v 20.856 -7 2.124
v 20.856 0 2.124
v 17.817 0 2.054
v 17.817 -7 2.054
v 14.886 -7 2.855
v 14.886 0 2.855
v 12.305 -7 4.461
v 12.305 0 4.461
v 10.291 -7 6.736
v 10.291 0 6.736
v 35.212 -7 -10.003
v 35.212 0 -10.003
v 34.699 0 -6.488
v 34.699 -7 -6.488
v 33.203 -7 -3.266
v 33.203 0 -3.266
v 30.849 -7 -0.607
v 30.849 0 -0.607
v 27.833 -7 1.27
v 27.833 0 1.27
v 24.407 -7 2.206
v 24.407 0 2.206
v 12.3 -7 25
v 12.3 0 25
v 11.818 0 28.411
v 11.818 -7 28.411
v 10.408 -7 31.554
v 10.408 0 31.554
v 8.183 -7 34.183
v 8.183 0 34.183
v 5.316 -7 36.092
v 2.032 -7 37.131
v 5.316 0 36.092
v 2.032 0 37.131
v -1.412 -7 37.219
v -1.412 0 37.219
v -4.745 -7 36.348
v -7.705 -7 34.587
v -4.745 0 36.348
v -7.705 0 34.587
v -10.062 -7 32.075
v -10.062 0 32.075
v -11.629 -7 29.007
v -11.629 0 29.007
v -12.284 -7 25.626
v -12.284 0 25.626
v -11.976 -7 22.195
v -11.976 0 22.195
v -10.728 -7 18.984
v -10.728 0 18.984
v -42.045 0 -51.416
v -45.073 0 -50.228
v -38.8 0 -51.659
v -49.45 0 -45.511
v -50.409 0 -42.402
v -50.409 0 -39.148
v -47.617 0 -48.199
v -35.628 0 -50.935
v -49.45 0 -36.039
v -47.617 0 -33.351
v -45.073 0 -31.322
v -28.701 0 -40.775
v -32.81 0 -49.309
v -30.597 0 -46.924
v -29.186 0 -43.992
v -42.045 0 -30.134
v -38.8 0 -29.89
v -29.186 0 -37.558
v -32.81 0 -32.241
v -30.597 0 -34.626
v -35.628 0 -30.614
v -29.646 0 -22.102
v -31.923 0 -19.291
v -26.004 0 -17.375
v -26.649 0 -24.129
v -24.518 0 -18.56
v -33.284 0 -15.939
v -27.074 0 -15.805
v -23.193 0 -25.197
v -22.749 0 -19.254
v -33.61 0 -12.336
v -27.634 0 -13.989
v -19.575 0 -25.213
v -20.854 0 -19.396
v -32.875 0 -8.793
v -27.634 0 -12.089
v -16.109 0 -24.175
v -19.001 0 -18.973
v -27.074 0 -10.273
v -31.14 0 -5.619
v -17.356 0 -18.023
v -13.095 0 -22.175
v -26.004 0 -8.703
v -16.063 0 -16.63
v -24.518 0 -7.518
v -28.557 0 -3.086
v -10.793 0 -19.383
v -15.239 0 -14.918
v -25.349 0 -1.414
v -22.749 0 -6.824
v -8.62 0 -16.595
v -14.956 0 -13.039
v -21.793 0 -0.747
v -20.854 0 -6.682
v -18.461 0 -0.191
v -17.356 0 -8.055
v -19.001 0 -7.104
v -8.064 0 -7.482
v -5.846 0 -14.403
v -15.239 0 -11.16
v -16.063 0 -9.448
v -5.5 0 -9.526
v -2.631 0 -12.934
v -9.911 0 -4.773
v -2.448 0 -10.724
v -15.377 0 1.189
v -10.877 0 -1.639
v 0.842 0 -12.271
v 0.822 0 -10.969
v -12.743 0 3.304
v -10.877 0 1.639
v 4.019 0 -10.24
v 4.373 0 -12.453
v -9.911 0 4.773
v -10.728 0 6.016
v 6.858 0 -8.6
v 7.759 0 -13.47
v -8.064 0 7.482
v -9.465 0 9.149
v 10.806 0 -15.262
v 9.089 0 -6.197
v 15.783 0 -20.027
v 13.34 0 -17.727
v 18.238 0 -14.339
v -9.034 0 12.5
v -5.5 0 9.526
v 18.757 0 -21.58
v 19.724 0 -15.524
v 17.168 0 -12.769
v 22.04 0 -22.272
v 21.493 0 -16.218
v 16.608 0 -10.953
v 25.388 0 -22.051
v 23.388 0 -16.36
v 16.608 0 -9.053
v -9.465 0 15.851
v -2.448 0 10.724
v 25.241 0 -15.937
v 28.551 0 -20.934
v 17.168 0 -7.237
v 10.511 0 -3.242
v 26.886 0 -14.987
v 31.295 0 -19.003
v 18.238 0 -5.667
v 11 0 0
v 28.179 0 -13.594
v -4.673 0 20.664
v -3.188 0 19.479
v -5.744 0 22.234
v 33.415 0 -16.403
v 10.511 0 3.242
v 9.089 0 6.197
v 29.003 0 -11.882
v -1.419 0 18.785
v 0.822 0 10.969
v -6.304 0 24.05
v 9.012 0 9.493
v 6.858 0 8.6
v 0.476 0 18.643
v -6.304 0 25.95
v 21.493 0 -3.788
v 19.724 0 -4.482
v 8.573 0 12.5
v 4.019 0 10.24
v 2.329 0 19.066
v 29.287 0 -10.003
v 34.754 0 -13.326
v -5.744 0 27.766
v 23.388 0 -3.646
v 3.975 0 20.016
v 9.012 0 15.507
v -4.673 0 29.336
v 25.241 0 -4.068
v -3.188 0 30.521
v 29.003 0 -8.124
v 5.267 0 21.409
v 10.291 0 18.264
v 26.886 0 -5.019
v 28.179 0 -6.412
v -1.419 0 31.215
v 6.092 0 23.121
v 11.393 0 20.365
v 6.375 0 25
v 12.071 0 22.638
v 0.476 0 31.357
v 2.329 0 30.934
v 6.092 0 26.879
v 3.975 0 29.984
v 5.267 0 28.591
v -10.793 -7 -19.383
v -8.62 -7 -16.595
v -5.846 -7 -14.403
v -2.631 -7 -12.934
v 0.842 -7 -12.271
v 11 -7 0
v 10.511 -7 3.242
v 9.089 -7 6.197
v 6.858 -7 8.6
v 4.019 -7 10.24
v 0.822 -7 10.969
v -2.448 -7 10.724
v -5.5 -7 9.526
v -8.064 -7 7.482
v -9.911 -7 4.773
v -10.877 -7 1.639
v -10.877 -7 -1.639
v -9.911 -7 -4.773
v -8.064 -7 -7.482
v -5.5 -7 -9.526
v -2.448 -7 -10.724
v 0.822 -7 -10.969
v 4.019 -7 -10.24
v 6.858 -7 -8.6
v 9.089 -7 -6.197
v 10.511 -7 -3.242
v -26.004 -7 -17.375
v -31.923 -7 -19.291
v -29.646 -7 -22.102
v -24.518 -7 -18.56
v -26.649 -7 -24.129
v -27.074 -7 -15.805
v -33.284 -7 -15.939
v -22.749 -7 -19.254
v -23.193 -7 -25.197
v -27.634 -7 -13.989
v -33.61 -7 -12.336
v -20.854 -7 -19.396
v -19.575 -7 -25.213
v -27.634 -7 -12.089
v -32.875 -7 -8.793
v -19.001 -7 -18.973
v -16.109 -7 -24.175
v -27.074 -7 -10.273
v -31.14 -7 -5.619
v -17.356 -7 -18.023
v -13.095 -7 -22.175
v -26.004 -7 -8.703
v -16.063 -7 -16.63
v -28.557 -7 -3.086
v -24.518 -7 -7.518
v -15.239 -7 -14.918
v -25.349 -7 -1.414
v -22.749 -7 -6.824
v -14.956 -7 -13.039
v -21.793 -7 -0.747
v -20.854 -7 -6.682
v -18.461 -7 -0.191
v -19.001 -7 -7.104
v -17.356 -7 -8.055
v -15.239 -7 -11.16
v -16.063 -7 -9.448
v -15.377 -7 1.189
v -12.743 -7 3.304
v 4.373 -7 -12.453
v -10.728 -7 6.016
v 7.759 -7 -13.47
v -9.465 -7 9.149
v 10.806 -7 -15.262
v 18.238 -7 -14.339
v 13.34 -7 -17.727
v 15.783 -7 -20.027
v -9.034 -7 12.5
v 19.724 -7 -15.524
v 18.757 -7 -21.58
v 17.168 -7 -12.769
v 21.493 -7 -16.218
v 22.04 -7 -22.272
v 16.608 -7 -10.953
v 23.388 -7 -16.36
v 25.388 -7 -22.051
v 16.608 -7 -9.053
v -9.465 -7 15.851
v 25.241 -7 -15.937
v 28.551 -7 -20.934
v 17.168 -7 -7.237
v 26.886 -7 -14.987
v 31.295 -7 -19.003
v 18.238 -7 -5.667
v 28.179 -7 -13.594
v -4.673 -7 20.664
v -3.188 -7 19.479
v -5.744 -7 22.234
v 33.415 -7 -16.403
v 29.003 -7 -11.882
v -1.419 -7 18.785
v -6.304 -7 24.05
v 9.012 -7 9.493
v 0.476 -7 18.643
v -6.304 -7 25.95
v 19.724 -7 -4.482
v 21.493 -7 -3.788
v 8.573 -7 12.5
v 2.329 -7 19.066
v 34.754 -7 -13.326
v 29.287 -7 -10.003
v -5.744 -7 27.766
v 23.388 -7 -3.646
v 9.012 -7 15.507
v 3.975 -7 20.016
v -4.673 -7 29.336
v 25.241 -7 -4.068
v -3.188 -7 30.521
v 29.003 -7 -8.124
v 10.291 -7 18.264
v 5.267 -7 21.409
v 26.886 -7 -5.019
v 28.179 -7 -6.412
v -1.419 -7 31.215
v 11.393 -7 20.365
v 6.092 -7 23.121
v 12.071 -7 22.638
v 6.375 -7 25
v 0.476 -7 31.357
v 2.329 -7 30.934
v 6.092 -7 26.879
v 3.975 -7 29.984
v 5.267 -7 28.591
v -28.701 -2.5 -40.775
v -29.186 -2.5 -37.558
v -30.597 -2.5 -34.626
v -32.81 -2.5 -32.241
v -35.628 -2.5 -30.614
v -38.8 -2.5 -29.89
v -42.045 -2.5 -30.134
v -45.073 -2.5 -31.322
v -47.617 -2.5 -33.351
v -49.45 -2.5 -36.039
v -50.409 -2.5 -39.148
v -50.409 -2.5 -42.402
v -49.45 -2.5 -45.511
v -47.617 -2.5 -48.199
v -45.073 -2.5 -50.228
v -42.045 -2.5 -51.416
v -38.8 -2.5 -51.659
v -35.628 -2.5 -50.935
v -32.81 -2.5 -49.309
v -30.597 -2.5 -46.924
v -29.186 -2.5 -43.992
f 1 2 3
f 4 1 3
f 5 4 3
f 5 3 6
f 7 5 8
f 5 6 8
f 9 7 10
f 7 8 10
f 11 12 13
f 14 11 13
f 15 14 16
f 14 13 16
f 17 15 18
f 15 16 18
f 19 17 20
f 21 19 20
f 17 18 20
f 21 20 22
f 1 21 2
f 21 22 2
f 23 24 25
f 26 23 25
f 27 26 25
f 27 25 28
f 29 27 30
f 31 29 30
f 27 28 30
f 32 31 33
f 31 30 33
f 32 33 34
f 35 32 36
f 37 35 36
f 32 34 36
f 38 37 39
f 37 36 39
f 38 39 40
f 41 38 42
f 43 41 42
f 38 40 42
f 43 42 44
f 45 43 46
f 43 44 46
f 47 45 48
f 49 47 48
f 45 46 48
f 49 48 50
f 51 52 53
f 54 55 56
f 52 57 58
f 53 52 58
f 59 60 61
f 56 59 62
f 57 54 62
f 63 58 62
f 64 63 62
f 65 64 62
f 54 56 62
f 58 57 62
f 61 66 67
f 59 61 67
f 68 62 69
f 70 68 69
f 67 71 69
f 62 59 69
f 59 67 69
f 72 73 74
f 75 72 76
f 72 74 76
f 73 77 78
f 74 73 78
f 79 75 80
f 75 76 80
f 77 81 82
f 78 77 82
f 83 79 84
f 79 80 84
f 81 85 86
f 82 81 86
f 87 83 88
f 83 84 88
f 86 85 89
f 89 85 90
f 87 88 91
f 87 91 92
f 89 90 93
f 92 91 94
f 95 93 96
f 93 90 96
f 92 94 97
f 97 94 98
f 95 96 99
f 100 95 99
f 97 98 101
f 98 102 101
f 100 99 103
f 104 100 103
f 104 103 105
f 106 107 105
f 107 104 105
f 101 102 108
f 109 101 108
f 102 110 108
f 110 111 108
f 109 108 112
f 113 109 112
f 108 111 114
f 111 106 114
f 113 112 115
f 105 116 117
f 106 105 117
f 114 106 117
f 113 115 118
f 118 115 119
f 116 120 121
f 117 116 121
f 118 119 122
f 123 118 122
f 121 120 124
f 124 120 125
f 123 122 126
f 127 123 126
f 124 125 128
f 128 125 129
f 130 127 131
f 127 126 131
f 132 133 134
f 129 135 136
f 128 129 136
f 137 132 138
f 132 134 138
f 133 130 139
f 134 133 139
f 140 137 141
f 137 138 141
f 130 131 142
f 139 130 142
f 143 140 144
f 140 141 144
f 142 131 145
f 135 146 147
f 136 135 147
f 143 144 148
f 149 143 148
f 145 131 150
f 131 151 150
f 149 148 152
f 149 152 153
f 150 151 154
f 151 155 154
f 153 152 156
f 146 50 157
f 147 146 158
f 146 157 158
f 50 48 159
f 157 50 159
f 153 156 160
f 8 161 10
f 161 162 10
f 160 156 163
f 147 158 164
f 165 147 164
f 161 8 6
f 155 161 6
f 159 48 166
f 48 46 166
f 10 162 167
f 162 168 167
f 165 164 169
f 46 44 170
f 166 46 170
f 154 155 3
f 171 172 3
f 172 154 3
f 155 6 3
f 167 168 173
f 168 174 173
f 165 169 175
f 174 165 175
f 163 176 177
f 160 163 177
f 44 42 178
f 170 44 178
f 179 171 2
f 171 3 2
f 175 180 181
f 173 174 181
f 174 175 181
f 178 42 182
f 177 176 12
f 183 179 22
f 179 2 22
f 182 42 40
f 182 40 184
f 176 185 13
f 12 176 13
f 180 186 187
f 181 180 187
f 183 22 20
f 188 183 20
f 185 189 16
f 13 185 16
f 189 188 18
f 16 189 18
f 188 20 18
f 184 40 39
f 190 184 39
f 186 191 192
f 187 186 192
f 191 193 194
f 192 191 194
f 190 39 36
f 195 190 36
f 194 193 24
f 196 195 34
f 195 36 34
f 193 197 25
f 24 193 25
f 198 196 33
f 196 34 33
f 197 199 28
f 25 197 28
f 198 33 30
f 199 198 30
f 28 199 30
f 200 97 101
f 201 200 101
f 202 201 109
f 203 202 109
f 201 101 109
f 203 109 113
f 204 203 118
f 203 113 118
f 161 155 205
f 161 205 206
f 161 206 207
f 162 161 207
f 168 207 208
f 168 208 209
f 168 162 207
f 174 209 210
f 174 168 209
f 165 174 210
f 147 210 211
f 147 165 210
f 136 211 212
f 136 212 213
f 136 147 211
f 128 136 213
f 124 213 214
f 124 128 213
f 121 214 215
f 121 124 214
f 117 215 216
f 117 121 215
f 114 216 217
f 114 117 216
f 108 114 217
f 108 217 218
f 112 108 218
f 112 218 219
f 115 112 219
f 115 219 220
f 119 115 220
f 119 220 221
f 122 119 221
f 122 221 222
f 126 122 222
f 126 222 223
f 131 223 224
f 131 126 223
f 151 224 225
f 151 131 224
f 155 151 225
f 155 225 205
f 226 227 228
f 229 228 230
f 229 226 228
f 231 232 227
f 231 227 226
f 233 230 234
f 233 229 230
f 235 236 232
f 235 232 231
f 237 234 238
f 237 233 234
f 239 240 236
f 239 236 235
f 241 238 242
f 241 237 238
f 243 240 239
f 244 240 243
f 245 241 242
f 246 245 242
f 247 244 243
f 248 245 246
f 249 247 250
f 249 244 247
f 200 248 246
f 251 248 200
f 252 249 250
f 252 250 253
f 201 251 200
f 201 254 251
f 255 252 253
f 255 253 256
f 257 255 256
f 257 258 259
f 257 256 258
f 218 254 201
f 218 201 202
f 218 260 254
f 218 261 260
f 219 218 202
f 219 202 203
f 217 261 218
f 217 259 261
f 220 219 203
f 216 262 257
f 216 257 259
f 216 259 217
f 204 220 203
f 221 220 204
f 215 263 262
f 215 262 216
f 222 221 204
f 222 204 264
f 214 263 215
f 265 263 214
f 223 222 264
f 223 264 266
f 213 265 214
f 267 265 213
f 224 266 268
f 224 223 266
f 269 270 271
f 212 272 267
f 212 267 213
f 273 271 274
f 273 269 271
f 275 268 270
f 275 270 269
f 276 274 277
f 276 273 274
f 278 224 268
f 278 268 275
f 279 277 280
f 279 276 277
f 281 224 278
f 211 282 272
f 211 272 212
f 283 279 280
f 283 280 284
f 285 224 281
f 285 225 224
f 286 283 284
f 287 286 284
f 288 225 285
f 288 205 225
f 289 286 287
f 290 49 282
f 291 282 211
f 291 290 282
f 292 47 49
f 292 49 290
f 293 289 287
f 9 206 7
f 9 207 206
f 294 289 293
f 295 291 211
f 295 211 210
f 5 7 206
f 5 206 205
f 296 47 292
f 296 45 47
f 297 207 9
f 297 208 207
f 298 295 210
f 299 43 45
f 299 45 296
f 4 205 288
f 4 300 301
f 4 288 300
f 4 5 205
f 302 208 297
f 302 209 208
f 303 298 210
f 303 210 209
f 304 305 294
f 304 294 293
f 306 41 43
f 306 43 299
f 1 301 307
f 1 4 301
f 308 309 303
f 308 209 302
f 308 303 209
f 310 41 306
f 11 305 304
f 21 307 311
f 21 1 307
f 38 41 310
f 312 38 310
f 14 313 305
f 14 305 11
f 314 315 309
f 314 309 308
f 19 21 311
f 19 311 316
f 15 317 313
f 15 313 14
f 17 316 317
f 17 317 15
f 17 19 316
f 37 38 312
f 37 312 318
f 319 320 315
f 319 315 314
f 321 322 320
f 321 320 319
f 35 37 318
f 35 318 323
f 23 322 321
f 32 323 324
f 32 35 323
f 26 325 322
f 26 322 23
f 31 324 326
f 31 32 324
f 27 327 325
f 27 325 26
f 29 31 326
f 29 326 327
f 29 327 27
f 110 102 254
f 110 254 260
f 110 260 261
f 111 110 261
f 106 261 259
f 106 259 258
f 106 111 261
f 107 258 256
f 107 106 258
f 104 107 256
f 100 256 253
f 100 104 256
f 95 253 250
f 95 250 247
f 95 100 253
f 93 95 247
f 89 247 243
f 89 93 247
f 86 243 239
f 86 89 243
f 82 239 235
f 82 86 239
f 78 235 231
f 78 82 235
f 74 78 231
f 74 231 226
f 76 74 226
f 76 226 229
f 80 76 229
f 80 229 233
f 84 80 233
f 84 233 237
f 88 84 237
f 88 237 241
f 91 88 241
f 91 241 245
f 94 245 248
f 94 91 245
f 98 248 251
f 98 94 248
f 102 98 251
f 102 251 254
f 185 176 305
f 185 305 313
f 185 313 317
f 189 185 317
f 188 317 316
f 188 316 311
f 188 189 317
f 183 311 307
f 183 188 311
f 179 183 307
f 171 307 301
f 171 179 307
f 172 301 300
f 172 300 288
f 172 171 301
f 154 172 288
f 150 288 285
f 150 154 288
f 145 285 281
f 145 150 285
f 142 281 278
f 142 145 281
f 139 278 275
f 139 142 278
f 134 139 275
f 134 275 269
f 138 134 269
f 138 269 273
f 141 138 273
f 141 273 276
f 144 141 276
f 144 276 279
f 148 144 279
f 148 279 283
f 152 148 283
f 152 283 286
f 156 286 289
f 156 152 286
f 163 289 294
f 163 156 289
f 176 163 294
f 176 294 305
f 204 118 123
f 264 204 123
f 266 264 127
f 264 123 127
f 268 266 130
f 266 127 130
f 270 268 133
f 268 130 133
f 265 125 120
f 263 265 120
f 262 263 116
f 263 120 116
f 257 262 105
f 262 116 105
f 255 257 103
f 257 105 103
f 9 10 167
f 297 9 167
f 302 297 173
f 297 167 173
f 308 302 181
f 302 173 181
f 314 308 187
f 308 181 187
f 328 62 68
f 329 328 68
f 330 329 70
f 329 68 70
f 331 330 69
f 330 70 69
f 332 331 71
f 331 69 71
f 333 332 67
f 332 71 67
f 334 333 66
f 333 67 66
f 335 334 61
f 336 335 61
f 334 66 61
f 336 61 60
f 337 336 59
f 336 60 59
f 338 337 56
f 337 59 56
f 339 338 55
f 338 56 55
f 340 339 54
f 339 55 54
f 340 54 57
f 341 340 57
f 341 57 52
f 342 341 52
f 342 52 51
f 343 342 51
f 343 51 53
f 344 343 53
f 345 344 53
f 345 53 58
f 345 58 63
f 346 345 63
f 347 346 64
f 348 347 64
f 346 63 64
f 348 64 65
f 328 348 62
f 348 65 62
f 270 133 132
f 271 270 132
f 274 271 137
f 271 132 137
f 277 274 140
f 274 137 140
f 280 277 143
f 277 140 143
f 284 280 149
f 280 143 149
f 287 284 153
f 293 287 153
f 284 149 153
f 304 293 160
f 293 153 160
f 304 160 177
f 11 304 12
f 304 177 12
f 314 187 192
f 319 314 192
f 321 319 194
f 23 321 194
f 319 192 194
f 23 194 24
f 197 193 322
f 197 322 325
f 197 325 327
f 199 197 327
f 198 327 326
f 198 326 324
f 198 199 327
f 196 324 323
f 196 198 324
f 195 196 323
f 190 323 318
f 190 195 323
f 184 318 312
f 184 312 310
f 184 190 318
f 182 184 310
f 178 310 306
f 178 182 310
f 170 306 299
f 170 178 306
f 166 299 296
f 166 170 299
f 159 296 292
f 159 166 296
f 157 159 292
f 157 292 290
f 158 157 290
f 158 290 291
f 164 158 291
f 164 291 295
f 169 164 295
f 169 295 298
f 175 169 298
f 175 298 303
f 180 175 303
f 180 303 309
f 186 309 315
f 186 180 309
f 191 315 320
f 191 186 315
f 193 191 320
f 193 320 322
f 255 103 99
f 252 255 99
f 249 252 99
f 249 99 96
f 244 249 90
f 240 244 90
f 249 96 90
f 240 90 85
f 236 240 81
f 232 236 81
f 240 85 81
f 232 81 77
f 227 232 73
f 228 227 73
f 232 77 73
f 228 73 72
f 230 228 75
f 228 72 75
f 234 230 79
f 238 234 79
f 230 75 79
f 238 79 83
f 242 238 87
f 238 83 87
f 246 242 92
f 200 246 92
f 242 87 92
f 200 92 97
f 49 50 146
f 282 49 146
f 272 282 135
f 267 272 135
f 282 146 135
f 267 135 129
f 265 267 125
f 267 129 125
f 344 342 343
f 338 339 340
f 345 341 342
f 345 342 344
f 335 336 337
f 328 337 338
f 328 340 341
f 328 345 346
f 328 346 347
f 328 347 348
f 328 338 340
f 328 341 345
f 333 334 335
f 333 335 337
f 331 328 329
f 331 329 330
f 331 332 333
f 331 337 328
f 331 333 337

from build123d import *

# Parameters (mm, degrees)
F0_R     = 6.375
F0_R_2   = 11
F1_DEPTH = 7
F2_R     = 10.915
F2_R_2   = 4.5
F3_DEPTH = 2.5


# Not quite as in the source:
# - a feature names something its author has since deleted; it is built from what else it names
# - the program builds the solid bodies; features that only make, move or delete a surface that nothing else refers to are left out


with BuildPart() as f1:
    # F0 (on Front) → F1 (new body)
    with BuildSketch(Plane.XZ):
        with BuildLine():
            ThreePointArc((10.2913244925, 18.2636330126), (11.7871389925, 21.4852661024), (12.3, 25))
            ThreePointArc((12.3, 25), (-3.1089572961, 36.9006043767), (-10.7283552083, 18.983988487))
            ThreePointArc((-10.7283552083, 18.983988487), (-0.4212801491, 12.7072166278), (10.2913244925, 18.2636330126))
        make_face()
        with Locations((0, 25)):
            Circle(F0_R, mode=Mode.SUBTRACT)
        with BuildLine():
            ThreePointArc((10.2913244925, 18.2636330126), (-0.4212801491, 12.7072166278), (-10.7283552083, 18.983988487))
            ThreePointArc((-10.7283552083, 18.983988487), (-9.0344544049, 12.4999999397), (-10.7283552673, 6.0160114077))
            ThreePointArc((-10.7283552673, 6.0160114077), (-0.4212802335, 12.2927833693), (10.2913244661, 6.7363670278))
            ThreePointArc((10.2913244661, 6.7363670278), (8.5727024982, 12.5000000241), (10.2913244925, 18.2636330126))
        make_face()
        with BuildLine():
            ThreePointArc((10.2913244661, 6.7363670278), (-0.4212802335, 12.2927833693), (-10.7283552673, 6.0160114077))
            ThreePointArc((-10.7283552673, 6.0160114077), (-10.3942134043, -6.576498134), (0.8420661962, -12.2711419404))
            ThreePointArc((0.8420661962, -12.2711419404), (8.9902006155, -8.3944203429), (12.3, 0))
            ThreePointArc((12.3, 0), (11.7871389856, 3.5147339207), (10.2913244661, 6.7363670278))
        make_face()
        Circle(F0_R_2, mode=Mode.SUBTRACT)
        with BuildLine():
            ThreePointArc((0.8420661962, -12.2711419404), (-10.3942134043, -6.576498134), (-10.7283552673, 6.0160114077))
            ThreePointArc((-10.7283552673, 6.0160114077), (-15.3771779341, 1.1890192116), (-21.7929065021, -0.7474292877))
            ThreePointArc((-21.7929065021, -0.7474292877), (-12.7981553136, -4.1793542246), (-9.0305269511, -13.0387353677))
            ThreePointArc((-9.0305269511, -13.0387353677), (-9.4793966749, -16.3312588946), (-10.7932442154, -19.3834711816))
            ThreePointArc((-10.7932442154, -19.3834711816), (-5.8461277368, -14.4031615344), (0.8420661962, -12.2711419404))
        make_face()
        with BuildLine():
            ThreePointArc((20.8556822396, 2.1241866562), (14.8858646149, 2.8552166619), (10.2913244661, 6.7363670278))
            ThreePointArc((10.2913244661, 6.7363670278), (11.7871389856, 3.5147339207), (12.3, 0))
            ThreePointArc((12.3, 0), (8.9902006155, -8.3944203429), (0.8420661962, -12.2711419404))
            ThreePointArc((0.8420661962, -12.2711419404), (7.7588005924, -13.4695690785), (13.3398545128, -17.7274182361))
            ThreePointArc((13.3398545128, -17.7274182361), (11.4084974744, -5.6476549278), (20.8556822396, 2.1241866562))
        make_face()
        with BuildLine():
            ThreePointArc((-9.0305269511, -13.0387353677), (-12.7981553136, -4.1793542246), (-21.7929065021, -0.7474292877))
            ThreePointArc((-21.7929065021, -0.7474292877), (-31.9230447308, -19.2908203869), (-10.7932442154, -19.3834711816))
            ThreePointArc((-10.7932442154, -19.3834711816), (-9.4793966749, -16.3312588946), (-9.0305269511, -13.0387353677))
        make_face()
        with Locations((-21.3305269511, -13.0387353677)):
            Circle(F0_R, mode=Mode.SUBTRACT)
        with BuildLine():
            ThreePointArc((35.2116724729, -10.0027628432), (30.8489679862, -0.606522109), (20.8556822396, 2.1241866562))
            ThreePointArc((20.8556822396, 2.1241866562), (11.4084974744, -5.6476549278), (13.3398545128, -17.7274182361))
            ThreePointArc((13.3398545128, -17.7274182361), (27.0078071808, -21.6006799171), (35.2116724729, -10.0027628432))
        make_face()
        with Locations((22.9116724729, -10.0027628432)):
            Circle(F0_R, mode=Mode.SUBTRACT)
    extrude(amount=F1_DEPTH)


with BuildPart() as f3:
    # F2 (on Front) → F3 (new body)
    with BuildSketch(Plane.XZ):
        with Locations((-39.6157391369, -40.7749339938)):
            Circle(F2_R)
        with Locations((-39.6157391369, -40.7749339938)):
            Circle(F2_R_2, mode=Mode.SUBTRACT)
        with Locations((-39.6157391369, -40.7749339938)):
            Circle(F2_R_2)
    extrude(amount=F3_DEPTH)


solid = Compound([f1.part, f3.part])
